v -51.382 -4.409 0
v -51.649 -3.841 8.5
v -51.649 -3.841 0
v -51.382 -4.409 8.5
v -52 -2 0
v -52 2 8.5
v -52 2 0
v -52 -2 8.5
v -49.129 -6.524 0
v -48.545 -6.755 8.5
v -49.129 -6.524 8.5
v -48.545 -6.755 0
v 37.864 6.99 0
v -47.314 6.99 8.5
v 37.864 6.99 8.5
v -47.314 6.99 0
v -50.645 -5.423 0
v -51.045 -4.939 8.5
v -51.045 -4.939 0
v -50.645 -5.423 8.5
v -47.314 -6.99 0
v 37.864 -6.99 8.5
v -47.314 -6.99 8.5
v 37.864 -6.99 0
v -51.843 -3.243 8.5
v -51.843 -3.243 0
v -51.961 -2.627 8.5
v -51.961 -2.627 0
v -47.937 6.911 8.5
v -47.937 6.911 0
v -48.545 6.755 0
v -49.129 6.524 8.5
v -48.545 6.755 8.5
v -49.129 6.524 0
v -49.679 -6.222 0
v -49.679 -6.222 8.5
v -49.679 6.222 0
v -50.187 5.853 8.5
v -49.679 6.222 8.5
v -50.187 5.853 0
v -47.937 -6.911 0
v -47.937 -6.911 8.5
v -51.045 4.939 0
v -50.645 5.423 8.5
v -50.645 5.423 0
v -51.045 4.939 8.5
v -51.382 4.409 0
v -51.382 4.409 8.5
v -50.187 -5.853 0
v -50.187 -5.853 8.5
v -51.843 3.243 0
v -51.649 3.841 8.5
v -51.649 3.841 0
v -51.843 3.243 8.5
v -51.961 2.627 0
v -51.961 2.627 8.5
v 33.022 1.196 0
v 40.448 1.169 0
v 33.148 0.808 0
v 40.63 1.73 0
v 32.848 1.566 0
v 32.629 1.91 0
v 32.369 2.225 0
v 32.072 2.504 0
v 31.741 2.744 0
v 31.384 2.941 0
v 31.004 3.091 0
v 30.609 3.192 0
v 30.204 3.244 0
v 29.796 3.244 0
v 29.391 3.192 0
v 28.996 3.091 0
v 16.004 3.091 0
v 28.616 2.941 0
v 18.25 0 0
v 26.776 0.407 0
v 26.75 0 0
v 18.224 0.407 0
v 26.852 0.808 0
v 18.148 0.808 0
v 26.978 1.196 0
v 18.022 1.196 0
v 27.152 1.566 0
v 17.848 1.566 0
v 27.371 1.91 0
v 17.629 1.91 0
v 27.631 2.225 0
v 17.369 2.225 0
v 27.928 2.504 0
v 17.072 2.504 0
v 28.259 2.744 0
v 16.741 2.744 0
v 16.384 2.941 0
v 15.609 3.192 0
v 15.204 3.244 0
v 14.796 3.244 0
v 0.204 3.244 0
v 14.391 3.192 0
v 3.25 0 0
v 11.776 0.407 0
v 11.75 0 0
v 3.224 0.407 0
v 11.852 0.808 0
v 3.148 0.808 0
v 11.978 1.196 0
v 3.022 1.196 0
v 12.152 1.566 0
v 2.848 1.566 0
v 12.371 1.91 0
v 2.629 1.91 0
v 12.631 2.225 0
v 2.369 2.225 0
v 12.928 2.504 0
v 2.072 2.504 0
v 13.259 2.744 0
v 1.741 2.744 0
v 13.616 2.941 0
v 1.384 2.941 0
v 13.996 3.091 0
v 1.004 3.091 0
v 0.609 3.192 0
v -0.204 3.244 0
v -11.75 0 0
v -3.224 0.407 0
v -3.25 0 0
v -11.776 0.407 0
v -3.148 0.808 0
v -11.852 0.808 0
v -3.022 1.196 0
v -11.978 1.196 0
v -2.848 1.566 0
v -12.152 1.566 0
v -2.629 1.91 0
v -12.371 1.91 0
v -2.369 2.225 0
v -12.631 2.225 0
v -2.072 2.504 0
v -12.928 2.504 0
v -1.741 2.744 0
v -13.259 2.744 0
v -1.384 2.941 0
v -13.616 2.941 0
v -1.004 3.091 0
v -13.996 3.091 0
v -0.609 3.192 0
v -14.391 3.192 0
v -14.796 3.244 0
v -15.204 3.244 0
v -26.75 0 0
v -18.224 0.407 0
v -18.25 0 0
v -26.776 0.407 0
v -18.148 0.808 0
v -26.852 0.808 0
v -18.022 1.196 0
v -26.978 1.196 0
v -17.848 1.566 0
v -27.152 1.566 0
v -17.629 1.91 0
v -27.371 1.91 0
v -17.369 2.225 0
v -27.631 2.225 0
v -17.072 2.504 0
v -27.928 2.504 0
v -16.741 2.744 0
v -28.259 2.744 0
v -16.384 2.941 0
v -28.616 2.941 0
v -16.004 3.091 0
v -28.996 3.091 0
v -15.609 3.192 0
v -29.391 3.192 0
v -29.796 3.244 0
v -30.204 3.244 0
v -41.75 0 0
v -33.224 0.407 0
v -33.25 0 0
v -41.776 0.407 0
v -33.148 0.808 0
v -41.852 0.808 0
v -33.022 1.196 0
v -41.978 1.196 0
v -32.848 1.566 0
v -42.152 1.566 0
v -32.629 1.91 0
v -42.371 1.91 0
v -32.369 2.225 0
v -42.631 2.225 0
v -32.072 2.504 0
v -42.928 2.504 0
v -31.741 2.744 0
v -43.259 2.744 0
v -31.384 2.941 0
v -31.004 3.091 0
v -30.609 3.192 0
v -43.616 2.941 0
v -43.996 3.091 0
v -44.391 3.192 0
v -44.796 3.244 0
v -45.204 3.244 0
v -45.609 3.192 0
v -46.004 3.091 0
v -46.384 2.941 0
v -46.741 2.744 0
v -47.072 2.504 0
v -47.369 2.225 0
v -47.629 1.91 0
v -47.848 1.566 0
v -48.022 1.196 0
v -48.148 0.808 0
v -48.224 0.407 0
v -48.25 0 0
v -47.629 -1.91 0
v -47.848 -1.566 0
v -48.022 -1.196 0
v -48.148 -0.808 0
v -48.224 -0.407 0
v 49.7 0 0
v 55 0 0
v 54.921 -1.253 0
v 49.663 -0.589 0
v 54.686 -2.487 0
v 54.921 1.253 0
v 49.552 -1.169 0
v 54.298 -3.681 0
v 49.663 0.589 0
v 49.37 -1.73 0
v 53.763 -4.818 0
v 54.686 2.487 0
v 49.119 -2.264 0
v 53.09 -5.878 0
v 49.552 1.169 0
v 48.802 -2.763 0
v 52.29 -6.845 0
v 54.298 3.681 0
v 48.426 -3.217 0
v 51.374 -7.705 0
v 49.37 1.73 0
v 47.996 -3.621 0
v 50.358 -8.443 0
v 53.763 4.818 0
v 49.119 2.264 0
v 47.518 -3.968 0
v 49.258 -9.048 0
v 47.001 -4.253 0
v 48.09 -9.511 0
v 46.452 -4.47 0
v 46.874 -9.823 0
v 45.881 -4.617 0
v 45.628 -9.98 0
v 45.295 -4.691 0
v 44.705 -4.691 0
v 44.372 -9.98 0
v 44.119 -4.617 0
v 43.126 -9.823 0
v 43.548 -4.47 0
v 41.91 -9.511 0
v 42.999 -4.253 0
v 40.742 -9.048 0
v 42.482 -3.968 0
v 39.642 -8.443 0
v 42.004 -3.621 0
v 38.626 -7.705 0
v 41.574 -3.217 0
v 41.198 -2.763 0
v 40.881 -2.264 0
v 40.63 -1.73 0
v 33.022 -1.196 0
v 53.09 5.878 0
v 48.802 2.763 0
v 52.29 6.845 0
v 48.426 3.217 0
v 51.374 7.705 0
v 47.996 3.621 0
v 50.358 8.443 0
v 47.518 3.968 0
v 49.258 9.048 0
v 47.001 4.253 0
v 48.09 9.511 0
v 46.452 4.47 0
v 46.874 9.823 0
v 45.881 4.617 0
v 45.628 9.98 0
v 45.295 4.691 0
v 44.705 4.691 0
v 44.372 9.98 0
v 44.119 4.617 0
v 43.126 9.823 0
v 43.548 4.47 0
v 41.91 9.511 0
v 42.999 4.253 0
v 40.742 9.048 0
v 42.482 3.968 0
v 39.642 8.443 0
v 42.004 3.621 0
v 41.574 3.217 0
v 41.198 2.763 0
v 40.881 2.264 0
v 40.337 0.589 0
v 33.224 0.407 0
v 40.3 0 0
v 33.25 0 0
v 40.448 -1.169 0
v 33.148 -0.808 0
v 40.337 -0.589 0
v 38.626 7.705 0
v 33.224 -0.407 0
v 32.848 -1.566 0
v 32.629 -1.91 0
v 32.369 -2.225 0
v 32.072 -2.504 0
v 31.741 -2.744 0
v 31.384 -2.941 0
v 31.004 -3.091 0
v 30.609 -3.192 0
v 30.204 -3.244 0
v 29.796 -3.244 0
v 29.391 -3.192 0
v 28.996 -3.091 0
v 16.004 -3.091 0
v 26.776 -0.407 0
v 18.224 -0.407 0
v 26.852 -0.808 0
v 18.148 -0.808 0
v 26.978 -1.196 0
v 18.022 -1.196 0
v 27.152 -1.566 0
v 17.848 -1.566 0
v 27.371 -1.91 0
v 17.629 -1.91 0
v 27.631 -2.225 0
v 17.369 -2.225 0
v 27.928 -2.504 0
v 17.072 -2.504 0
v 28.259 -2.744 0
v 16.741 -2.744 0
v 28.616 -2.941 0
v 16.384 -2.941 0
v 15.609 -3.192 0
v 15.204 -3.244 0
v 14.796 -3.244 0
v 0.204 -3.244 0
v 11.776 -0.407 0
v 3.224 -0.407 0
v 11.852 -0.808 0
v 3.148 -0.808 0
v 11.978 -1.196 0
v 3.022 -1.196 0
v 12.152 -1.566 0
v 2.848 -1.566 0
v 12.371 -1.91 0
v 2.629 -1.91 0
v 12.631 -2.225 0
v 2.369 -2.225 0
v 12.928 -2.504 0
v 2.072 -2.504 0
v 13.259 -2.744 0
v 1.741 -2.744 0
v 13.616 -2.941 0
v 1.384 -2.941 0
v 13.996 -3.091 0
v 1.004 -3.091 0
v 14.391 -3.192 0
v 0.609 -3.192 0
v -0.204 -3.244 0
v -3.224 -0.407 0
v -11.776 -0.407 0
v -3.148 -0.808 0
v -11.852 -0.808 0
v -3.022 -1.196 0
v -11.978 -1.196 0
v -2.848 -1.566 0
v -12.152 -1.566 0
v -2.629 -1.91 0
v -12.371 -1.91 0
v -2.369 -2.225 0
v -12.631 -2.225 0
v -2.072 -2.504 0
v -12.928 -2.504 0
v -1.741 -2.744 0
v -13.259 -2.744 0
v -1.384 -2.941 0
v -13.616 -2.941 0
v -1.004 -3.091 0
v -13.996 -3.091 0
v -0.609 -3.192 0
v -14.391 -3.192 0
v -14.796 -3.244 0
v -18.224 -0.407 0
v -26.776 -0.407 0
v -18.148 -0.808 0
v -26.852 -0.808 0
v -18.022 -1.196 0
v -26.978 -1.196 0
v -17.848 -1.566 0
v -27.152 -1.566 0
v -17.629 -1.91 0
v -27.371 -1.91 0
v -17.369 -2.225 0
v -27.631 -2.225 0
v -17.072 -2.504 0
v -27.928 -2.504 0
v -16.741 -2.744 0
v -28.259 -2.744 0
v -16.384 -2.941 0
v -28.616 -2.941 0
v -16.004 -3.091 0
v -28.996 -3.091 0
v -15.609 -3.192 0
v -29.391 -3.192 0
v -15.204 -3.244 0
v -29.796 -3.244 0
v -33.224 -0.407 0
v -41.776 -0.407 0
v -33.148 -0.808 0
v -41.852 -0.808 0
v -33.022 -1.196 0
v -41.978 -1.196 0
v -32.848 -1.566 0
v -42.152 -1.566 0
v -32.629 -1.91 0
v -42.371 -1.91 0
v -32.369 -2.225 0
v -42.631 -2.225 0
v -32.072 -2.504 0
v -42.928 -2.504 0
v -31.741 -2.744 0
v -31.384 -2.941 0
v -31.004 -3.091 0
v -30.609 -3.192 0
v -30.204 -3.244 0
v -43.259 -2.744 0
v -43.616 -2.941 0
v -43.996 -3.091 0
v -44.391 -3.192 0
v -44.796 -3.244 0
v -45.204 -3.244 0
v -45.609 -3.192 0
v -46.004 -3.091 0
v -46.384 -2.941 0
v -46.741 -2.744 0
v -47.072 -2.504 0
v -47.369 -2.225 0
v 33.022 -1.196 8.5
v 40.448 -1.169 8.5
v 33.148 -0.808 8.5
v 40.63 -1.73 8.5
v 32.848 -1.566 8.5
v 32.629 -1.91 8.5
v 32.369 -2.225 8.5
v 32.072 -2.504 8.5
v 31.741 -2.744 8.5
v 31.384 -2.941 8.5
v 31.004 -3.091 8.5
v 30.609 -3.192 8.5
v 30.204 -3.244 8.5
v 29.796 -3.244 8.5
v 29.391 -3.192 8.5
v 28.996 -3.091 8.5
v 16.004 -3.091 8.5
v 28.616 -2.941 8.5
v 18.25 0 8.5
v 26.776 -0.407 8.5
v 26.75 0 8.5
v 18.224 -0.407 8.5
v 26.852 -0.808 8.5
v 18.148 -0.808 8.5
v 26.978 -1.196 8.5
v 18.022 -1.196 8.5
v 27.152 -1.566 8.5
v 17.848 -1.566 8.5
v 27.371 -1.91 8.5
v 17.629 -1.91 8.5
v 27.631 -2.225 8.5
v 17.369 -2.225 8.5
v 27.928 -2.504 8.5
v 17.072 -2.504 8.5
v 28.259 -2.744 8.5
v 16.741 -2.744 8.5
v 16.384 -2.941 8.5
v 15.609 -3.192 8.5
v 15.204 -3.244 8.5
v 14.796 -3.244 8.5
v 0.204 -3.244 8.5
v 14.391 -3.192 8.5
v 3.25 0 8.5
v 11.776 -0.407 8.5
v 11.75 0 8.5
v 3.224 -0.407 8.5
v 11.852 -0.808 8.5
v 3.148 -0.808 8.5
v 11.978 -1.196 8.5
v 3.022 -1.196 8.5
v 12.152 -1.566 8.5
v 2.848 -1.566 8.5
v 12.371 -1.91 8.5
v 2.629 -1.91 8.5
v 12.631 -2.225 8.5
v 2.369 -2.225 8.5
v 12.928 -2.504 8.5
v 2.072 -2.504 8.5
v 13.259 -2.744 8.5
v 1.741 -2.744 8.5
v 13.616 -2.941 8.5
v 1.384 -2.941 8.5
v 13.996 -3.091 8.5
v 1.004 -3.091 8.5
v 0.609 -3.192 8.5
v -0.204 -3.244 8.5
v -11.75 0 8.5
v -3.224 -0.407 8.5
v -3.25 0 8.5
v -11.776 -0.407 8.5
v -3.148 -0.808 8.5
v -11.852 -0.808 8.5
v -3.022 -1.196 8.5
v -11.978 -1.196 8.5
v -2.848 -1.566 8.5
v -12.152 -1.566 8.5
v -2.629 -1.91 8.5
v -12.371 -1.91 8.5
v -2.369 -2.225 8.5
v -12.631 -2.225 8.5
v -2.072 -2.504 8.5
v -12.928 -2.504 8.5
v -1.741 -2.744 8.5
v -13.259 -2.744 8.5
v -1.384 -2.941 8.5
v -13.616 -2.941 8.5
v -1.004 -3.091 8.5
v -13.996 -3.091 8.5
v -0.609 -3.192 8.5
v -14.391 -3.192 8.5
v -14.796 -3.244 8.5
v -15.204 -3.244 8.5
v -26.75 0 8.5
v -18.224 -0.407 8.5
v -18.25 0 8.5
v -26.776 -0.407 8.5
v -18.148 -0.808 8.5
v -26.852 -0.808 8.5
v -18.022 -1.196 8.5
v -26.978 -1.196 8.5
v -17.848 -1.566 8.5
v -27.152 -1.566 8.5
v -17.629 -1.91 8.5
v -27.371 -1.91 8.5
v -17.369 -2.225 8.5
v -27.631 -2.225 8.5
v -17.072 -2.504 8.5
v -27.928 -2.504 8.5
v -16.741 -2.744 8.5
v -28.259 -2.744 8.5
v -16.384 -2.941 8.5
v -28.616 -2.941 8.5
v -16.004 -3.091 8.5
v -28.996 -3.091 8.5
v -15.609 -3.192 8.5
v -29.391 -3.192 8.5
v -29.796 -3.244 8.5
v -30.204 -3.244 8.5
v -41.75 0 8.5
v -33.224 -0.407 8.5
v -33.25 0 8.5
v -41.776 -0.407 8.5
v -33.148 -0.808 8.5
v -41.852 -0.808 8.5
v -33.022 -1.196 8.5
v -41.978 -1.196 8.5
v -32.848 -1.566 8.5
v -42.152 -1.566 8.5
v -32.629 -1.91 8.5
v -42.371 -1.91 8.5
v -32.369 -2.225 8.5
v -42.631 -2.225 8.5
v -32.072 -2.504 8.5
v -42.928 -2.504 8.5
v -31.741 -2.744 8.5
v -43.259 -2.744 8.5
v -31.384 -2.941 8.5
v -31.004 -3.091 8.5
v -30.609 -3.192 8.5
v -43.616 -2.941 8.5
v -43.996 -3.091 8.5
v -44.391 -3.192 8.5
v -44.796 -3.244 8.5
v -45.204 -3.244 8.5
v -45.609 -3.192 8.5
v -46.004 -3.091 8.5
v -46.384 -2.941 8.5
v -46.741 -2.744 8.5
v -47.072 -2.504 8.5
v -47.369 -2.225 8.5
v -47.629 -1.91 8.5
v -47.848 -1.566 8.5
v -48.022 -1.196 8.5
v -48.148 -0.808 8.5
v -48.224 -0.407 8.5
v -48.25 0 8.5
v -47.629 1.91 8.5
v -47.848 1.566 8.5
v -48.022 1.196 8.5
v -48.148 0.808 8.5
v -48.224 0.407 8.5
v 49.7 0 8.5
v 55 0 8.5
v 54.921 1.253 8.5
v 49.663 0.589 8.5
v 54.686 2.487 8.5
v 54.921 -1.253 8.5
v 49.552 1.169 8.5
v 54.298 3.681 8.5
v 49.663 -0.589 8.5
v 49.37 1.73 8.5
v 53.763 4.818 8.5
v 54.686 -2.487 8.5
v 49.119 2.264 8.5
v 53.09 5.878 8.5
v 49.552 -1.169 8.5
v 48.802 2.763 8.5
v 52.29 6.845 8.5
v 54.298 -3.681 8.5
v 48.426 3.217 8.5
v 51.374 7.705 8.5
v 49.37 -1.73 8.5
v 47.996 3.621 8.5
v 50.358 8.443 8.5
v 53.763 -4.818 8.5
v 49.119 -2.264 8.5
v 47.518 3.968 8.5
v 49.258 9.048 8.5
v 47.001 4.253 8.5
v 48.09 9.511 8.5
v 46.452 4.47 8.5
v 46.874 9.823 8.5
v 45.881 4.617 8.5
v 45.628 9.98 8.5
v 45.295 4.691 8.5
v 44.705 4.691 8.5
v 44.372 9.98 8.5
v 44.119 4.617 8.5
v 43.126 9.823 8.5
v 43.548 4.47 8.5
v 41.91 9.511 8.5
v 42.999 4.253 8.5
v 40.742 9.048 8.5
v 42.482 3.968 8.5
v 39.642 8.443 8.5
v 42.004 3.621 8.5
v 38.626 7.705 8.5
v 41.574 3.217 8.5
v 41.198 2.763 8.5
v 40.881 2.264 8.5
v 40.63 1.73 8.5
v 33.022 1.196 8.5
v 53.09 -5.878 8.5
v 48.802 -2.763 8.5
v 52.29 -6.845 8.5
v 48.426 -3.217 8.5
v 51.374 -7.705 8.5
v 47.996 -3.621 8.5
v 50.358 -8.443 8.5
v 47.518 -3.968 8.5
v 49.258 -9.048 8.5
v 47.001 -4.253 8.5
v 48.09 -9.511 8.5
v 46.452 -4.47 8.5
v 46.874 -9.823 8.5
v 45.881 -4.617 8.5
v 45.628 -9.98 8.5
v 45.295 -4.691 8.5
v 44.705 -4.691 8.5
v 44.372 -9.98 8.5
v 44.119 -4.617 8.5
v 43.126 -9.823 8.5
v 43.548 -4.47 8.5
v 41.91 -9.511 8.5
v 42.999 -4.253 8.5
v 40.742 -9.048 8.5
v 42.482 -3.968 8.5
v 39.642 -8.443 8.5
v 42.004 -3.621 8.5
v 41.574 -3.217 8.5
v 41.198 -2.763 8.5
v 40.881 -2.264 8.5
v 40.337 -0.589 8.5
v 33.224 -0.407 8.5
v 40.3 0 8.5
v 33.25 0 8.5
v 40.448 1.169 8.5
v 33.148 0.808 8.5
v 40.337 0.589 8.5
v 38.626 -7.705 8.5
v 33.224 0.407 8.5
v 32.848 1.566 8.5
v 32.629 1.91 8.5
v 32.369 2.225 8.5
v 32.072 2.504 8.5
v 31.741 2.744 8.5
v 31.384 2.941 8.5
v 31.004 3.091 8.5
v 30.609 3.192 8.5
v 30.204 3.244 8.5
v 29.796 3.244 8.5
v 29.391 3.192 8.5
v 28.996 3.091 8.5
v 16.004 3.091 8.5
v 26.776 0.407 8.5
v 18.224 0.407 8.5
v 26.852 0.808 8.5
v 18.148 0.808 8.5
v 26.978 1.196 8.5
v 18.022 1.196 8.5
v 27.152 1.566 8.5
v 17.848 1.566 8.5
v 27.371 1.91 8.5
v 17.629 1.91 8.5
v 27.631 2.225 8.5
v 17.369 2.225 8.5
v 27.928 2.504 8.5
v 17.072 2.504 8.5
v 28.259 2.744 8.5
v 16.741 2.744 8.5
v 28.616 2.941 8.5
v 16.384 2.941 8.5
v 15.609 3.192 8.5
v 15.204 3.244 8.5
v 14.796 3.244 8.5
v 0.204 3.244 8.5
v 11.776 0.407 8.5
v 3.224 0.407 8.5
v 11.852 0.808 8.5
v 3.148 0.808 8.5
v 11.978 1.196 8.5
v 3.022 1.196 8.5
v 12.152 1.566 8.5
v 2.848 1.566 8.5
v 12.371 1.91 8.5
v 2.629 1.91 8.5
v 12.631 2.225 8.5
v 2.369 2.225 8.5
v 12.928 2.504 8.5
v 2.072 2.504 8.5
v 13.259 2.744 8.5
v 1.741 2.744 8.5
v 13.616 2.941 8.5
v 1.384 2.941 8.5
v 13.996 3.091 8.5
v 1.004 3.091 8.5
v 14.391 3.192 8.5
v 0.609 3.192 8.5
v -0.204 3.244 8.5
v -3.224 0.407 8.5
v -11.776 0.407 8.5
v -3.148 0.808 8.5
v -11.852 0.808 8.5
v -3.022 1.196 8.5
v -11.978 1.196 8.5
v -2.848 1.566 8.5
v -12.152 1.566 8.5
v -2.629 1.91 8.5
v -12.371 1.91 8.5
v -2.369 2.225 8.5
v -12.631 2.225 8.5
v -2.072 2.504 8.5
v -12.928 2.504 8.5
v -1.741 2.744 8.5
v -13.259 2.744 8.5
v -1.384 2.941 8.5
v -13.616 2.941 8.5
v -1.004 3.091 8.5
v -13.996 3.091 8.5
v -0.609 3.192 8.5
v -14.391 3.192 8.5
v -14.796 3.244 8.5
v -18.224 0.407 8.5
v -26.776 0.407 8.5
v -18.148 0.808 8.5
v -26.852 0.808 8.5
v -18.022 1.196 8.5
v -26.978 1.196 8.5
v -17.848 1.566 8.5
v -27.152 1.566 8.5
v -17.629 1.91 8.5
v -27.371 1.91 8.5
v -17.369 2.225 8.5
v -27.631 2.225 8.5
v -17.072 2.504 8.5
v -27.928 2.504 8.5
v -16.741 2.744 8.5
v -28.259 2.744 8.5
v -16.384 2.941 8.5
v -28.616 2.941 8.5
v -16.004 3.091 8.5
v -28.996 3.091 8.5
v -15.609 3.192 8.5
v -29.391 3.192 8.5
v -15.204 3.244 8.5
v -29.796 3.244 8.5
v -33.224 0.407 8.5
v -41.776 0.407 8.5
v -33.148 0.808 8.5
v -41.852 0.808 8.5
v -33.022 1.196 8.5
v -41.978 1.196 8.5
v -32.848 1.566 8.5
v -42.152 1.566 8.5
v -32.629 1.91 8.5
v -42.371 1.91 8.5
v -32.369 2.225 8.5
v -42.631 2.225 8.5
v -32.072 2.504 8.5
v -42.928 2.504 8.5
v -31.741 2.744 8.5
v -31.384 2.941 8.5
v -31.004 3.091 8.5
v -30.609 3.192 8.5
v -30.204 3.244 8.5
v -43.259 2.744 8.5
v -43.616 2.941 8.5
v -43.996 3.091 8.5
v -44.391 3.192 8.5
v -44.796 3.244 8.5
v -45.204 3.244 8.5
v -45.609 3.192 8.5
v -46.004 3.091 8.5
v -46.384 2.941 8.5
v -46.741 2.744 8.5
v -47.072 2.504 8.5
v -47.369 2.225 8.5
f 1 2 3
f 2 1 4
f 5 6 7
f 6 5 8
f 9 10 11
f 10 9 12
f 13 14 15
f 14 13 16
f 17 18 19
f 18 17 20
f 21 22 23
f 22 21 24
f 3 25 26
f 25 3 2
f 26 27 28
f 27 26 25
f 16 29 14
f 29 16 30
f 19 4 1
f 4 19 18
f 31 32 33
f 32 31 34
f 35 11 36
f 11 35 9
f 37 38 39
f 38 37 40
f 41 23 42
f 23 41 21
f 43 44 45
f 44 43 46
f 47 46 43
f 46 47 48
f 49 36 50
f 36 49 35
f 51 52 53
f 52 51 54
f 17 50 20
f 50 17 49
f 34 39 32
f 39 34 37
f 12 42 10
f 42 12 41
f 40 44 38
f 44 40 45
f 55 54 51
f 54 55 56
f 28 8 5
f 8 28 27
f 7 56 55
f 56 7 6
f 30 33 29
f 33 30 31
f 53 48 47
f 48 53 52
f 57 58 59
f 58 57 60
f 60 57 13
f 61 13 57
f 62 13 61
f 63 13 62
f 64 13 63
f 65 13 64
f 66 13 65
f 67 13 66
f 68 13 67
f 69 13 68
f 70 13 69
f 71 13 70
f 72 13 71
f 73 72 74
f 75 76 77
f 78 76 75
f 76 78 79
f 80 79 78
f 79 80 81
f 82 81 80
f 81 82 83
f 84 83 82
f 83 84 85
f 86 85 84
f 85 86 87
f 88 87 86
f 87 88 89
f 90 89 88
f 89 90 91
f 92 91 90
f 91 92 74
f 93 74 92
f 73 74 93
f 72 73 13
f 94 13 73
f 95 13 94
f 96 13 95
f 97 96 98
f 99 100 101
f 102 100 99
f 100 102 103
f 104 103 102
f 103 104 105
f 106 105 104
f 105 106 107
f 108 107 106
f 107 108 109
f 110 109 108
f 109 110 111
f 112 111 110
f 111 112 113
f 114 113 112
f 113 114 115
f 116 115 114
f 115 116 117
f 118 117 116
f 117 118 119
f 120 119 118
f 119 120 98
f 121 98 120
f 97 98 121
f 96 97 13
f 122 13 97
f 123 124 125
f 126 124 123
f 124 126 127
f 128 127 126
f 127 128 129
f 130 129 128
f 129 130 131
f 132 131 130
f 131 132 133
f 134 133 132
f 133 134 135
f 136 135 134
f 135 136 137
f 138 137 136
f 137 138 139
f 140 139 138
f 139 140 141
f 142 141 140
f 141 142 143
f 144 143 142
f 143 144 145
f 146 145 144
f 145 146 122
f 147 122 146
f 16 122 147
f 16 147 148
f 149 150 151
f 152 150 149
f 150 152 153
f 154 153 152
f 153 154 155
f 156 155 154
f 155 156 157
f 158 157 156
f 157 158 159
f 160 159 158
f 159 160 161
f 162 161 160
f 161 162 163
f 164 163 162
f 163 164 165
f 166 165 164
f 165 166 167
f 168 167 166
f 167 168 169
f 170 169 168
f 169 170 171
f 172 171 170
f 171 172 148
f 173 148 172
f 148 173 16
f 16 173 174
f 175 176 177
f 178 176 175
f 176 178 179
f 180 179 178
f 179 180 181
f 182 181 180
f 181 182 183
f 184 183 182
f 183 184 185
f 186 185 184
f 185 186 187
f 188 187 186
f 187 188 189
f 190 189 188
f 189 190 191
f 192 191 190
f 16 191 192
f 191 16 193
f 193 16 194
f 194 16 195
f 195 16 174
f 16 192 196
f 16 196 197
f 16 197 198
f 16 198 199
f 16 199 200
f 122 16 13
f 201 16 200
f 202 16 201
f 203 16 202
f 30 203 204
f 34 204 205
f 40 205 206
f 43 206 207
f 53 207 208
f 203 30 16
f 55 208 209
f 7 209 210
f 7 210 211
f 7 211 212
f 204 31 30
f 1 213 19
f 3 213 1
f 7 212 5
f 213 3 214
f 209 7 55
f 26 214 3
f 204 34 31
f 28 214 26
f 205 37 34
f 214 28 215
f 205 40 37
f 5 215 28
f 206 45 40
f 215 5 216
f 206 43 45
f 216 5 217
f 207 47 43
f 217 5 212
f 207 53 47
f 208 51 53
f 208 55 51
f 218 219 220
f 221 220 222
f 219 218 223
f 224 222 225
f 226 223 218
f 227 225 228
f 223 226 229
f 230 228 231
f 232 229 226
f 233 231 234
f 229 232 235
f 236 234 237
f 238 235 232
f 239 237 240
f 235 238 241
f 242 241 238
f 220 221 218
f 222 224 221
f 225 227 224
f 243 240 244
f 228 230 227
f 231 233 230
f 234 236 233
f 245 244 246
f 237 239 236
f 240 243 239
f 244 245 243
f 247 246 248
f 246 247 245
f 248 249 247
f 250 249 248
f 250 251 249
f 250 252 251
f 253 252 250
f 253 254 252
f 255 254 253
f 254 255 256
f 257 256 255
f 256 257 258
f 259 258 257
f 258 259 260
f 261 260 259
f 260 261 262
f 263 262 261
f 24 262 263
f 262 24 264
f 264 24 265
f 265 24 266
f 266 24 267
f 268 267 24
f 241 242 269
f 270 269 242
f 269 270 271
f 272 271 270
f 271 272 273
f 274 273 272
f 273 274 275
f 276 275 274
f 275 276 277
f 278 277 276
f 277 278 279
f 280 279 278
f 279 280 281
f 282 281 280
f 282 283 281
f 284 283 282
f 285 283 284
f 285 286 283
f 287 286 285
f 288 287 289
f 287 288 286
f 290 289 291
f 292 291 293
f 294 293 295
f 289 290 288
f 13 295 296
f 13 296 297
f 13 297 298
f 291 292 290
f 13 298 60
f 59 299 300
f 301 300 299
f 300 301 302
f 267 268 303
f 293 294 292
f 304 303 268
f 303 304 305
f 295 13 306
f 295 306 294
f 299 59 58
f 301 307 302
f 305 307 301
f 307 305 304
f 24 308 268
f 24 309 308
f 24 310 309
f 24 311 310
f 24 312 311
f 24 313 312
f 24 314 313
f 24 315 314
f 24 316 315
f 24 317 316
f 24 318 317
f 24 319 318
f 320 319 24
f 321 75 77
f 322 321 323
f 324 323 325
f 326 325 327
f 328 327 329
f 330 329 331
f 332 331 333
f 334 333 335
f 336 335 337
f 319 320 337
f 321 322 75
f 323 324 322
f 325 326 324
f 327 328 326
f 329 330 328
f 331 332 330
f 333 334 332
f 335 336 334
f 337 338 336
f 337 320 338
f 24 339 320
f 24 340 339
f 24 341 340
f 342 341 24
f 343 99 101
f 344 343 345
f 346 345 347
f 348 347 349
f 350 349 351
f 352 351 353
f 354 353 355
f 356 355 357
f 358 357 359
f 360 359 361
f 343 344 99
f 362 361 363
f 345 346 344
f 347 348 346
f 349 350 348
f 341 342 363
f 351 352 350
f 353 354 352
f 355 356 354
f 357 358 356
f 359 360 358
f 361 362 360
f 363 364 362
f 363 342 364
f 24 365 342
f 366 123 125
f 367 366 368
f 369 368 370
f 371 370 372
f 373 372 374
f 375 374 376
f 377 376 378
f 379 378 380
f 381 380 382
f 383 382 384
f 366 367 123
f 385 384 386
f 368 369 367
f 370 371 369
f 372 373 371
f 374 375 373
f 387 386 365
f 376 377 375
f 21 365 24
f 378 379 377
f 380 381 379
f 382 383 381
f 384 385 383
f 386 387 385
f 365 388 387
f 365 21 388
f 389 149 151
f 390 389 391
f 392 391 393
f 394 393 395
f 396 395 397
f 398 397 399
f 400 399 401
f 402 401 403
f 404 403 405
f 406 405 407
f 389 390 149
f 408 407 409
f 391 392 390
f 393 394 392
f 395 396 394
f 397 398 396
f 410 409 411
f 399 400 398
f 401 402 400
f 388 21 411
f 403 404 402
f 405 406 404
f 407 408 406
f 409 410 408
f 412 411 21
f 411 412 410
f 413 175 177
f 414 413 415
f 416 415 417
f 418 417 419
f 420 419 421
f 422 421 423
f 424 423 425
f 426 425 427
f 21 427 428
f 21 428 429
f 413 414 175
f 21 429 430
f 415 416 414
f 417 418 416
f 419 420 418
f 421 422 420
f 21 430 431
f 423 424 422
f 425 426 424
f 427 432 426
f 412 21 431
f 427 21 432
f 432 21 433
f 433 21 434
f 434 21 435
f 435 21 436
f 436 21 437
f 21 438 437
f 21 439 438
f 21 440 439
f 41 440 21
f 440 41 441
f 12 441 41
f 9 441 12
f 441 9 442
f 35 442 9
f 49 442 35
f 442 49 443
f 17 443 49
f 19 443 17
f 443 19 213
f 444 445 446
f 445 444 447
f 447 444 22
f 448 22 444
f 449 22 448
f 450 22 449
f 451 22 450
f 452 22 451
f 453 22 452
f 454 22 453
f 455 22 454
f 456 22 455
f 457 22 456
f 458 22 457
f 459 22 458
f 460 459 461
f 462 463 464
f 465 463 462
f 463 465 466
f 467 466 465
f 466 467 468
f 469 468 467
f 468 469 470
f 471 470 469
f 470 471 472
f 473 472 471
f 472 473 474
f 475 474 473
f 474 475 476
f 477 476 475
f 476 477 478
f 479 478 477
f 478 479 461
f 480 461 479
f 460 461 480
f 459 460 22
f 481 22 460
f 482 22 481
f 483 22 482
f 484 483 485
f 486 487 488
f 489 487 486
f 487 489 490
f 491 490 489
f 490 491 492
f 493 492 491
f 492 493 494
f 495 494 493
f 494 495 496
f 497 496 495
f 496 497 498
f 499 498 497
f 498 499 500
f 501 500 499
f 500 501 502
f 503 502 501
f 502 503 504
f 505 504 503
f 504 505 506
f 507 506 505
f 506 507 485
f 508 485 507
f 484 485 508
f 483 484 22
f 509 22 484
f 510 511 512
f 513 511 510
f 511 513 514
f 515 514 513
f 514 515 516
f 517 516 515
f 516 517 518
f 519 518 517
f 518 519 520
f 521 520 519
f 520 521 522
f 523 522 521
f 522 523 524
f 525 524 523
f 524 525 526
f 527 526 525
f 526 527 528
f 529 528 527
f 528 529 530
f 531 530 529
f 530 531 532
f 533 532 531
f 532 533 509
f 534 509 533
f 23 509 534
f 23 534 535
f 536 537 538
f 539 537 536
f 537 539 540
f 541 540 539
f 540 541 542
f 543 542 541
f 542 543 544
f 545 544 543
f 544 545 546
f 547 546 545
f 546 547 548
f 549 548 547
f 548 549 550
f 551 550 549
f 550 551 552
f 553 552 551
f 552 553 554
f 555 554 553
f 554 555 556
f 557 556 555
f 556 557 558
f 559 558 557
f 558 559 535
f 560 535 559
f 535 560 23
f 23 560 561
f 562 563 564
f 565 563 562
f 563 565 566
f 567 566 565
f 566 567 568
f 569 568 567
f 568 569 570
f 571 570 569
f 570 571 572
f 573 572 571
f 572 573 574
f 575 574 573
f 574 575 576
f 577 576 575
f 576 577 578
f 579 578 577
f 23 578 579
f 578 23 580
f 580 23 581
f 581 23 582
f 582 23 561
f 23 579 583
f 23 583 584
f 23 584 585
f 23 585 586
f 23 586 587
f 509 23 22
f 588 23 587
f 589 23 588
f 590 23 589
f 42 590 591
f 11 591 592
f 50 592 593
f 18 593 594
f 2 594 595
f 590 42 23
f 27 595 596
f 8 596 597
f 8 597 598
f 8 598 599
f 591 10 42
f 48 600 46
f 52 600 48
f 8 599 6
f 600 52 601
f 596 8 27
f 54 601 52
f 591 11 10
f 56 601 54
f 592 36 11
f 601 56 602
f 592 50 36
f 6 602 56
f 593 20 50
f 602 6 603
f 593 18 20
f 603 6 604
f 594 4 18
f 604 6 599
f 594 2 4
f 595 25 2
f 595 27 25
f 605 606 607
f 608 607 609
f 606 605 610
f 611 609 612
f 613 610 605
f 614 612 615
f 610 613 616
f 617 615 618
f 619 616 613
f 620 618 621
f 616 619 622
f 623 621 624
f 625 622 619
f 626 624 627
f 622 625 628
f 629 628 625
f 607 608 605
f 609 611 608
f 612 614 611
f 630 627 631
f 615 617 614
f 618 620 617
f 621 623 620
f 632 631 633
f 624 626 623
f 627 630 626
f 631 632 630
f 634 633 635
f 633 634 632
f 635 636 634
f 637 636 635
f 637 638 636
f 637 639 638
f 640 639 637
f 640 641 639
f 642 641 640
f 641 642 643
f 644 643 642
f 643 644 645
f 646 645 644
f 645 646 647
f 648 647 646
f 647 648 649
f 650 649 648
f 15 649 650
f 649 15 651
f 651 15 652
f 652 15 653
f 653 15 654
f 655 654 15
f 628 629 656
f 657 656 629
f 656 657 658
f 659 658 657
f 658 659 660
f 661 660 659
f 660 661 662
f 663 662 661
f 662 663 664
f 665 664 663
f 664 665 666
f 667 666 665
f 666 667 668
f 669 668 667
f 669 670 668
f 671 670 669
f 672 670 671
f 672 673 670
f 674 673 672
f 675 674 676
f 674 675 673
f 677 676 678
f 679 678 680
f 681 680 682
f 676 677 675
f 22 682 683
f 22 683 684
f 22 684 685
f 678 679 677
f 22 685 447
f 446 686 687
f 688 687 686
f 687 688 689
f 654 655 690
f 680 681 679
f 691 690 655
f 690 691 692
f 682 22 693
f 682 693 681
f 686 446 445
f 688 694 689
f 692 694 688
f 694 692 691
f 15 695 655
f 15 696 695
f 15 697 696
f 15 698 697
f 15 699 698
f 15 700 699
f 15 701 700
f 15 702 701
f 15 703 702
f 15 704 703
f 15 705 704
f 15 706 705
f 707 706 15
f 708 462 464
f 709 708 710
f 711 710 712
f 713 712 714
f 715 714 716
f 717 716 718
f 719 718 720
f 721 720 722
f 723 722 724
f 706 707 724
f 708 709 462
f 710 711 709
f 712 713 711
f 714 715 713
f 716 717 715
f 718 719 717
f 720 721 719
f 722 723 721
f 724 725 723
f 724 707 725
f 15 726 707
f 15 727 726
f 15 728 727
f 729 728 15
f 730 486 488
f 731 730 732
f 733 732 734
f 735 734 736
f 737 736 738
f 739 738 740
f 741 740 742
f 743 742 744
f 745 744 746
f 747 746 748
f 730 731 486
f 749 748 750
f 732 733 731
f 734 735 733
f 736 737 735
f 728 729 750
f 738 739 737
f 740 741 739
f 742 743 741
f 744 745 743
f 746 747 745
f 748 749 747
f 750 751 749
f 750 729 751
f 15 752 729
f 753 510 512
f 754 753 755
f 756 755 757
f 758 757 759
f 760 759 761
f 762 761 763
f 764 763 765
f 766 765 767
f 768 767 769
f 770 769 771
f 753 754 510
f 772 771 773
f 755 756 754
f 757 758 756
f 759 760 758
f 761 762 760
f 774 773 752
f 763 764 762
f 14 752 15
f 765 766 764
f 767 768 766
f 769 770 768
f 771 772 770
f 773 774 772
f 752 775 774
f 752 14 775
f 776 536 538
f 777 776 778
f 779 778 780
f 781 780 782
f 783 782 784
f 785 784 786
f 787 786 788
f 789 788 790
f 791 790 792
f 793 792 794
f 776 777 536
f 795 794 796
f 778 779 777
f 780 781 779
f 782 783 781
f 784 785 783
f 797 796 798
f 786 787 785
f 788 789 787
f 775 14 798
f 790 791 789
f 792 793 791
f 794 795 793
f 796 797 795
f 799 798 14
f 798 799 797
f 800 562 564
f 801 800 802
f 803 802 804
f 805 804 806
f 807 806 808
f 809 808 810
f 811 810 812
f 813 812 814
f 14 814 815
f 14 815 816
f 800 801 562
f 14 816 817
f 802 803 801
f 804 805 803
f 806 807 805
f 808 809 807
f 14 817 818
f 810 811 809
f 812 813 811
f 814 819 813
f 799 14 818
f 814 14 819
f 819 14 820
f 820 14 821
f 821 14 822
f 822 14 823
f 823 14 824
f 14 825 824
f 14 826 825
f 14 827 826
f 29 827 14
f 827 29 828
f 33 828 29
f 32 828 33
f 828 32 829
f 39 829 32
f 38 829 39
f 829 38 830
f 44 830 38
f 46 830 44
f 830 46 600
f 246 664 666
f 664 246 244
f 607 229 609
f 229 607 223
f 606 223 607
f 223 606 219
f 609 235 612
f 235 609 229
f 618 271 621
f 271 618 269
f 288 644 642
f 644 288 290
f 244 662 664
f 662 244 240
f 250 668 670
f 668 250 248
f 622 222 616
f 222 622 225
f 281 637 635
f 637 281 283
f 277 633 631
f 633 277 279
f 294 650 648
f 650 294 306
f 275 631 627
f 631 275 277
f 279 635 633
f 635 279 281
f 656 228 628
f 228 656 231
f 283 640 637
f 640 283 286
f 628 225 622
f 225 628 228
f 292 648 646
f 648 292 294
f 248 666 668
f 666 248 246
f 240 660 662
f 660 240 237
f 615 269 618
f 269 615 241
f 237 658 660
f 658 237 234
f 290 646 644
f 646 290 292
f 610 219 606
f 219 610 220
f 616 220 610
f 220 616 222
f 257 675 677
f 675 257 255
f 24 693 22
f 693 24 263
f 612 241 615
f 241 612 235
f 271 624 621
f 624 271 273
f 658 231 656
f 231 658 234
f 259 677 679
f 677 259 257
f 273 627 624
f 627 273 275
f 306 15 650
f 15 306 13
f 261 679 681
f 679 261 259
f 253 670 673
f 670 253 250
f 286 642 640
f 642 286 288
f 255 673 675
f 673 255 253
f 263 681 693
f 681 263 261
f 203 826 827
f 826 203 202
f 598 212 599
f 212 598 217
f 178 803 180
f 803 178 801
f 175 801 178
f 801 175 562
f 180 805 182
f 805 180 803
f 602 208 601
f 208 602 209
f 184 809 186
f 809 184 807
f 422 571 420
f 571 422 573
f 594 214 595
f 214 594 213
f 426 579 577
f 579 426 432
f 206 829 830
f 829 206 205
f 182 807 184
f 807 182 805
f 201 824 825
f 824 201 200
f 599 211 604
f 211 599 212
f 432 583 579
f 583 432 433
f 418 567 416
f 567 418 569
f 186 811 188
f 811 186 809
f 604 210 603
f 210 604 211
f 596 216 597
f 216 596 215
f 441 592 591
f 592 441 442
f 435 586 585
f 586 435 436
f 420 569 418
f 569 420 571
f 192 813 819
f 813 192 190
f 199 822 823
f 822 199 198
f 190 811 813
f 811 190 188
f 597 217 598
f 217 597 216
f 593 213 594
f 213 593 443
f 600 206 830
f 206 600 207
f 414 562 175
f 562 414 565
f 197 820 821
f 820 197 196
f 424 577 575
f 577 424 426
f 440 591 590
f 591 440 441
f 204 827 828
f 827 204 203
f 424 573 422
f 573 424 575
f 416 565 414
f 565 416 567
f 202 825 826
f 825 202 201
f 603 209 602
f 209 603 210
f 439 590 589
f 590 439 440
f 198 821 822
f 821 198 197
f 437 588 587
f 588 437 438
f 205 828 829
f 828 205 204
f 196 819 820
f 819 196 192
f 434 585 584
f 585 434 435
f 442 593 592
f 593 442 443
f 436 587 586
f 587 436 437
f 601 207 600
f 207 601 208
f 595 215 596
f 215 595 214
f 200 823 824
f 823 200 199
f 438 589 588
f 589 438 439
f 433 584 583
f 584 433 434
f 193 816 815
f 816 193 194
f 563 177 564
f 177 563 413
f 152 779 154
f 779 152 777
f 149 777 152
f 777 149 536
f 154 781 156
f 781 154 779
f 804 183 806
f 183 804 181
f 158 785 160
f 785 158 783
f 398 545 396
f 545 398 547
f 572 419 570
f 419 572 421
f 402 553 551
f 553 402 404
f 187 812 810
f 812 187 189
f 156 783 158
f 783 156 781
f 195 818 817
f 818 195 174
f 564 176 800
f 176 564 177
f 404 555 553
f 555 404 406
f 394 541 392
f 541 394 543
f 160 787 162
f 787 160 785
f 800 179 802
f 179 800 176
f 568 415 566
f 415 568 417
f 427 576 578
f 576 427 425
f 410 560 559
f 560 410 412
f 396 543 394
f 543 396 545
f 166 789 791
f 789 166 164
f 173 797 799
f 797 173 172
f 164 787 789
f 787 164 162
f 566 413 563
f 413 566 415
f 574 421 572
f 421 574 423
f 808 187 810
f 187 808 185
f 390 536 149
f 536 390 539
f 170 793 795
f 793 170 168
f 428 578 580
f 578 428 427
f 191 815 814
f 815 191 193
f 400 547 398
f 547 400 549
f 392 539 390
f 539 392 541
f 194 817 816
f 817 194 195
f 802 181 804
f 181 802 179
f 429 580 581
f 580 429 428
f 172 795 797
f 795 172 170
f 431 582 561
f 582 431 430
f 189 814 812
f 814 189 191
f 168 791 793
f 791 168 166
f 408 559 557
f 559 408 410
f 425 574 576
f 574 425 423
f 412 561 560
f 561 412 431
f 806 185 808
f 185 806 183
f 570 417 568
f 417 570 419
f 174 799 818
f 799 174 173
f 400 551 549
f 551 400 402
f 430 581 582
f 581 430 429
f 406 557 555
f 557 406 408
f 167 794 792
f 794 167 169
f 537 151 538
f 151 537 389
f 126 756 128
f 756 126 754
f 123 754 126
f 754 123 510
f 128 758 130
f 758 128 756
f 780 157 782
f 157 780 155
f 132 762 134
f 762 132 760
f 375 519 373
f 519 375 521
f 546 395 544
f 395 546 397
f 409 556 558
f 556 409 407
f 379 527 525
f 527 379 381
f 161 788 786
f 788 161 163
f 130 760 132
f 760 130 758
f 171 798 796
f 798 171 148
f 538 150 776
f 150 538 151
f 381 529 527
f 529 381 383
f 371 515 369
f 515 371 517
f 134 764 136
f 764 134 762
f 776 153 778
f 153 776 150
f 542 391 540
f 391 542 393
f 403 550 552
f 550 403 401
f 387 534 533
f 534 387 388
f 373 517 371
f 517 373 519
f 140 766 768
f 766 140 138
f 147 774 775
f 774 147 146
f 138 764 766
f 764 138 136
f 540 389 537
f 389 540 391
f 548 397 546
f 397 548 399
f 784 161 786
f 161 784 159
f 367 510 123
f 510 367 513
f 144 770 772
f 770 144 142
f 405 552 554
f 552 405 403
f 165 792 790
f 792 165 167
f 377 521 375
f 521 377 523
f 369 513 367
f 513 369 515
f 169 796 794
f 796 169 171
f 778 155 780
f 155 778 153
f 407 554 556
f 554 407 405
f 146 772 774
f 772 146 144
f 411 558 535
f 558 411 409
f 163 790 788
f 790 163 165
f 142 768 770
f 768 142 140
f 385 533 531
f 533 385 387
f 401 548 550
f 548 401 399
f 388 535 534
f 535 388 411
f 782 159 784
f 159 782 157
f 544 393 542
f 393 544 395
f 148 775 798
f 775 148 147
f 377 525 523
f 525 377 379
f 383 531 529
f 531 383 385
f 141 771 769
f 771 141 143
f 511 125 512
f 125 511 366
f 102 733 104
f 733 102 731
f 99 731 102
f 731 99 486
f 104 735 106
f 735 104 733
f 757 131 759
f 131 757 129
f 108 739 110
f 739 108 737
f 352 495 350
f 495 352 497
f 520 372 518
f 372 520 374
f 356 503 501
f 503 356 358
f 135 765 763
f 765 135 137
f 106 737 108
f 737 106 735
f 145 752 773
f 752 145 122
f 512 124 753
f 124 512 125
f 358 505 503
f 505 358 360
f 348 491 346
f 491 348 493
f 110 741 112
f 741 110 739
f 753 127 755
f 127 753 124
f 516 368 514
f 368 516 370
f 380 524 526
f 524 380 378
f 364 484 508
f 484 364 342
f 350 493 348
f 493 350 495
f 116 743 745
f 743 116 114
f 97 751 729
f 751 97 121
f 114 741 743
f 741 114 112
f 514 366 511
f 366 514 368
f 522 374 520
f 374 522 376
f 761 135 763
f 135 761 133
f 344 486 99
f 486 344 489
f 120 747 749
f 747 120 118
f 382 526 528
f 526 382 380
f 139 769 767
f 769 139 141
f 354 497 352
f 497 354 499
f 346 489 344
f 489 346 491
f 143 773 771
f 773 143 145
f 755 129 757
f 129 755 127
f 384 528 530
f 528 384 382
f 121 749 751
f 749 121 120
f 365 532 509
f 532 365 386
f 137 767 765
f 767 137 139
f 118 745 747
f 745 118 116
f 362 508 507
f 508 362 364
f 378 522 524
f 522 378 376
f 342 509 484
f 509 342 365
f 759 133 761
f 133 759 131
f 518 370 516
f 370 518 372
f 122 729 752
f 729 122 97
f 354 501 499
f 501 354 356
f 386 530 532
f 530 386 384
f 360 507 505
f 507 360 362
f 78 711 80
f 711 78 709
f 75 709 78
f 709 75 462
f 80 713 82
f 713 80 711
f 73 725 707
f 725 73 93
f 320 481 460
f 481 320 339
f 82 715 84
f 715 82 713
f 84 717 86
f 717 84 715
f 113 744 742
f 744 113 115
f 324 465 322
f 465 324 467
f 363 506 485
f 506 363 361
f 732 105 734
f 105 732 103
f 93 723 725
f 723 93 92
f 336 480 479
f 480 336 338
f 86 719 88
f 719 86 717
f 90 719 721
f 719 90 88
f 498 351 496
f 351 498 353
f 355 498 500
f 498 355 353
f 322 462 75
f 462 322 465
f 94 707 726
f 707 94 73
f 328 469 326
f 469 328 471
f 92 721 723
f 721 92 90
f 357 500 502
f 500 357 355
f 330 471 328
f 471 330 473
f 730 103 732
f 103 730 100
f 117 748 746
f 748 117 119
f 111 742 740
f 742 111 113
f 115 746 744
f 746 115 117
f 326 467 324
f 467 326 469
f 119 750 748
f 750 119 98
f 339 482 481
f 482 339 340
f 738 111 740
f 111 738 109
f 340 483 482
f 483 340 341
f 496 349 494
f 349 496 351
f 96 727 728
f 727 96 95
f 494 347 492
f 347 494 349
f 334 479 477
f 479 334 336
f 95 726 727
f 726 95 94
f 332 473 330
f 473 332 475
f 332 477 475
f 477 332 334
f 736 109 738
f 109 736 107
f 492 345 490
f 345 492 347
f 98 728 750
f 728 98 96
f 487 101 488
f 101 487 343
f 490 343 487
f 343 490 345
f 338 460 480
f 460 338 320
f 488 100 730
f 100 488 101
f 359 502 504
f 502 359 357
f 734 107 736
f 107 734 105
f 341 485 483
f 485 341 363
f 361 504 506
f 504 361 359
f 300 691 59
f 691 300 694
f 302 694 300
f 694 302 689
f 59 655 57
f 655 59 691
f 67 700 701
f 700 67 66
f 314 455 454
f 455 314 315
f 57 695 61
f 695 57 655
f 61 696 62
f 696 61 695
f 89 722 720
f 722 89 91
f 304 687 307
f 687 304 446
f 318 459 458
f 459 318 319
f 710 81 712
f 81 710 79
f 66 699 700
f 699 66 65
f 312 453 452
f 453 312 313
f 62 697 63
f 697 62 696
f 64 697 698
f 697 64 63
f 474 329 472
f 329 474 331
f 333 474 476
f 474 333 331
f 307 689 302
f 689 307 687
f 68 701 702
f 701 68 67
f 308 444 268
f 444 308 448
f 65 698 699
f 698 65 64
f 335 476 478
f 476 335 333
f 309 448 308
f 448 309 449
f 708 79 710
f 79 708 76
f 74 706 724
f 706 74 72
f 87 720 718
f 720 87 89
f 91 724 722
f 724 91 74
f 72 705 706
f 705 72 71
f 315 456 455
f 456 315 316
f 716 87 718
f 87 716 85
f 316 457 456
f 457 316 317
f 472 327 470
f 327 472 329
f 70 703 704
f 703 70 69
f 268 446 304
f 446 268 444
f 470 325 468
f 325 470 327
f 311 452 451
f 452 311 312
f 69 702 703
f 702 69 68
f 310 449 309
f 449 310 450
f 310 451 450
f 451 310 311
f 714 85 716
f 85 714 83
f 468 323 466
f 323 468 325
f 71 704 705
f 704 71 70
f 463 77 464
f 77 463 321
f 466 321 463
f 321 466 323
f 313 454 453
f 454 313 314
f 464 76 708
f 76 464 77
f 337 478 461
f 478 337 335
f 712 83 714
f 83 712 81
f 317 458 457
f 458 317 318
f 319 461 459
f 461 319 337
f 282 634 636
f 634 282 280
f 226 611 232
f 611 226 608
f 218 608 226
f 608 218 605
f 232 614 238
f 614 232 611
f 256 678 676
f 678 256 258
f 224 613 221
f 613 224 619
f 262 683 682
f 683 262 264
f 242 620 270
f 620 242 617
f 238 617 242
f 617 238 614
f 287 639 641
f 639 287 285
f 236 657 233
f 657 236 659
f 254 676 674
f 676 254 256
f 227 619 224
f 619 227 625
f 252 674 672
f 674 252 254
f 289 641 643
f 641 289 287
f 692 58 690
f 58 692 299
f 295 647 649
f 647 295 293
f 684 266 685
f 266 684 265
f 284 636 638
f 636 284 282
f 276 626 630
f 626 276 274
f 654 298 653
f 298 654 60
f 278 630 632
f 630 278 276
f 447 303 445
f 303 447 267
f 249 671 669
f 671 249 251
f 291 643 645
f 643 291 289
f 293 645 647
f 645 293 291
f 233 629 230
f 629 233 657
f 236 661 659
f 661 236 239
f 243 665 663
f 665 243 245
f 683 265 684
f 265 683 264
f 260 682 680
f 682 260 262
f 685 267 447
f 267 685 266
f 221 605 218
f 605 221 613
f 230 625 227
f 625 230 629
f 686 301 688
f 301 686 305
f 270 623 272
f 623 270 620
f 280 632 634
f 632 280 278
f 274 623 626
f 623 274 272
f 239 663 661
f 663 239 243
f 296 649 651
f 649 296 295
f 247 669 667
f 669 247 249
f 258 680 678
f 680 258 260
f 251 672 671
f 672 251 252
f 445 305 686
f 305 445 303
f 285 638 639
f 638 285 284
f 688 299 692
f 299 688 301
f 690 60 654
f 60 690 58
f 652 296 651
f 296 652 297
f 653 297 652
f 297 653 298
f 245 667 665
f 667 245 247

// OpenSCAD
$fn = 50;


difference() {
	union() {
		*color(alpha = 1.0000000000, c = "gray") {
			translate(v = [0, 7, 0]) {
				linear_extrude(height = 1) {
					text(font = "Arial:style=Bold", halign = "center", size = 4.5000000000, text = "COMMENT plate main", valign = "center");
				}
			}
		}
		*color(alpha = 1.0000000000, c = "gray") {
			translate(v = [0, 14, 0]) {
				linear_extrude(height = 1) {
					text(font = "Arial:style=Bold", halign = "center", size = 4.5000000000, text = "COMMENT description oobb_plate_shape_p_type_8.5_depth_7_width_1_height_8.5_thickness_slip_end_extra", valign = "center");
				}
			}
		}
		hull() {
			translate(v = [-47.0000000000, 2.0000000000, 0]) {
				cylinder(h = 8.5000000000, r = 5);
			}
			translate(v = [47.0000000000, 2.0000000000, 0]) {
				cylinder(h = 8.5000000000, r = 5);
			}
			translate(v = [-47.0000000000, -2.0000000000, 0]) {
				cylinder(h = 8.5000000000, r = 5);
			}
			translate(v = [47.0000000000, -2.0000000000, 0]) {
				cylinder(h = 8.5000000000, r = 5);
			}
		}
		translate(v = [45.0000000000, 0, 0.0000000000]) {
			cylinder(h = 8.5000000000, r = 10.0000000000);
		}
	}
	union() {
		*color(alpha = 1.0000000000, c = "gray") {
			translate(v = [0, 7, 0]) {
				linear_extrude(height = 1) {
					text(font = "Arial:style=Bold", halign = "center", size = 4.5000000000, text = "COMMENT holes main", valign = "center");
				}
			}
		}
		*color(alpha = 1.0000000000, c = "gray") {
			translate(v = [0, 14, 0]) {
				linear_extrude(height = 1) {
					text(font = "Arial:style=Bold", halign = "center", size = 4.5000000000, text = "COMMENT description oobb_holes_shape_n_type_7_width_1_height_8.5_thickness_slip_end_extra_false_both_holes", valign = "center");
				}
			}
		}
		translate(v = [-45.0000000000, 0.0000000000, 0]) {
			translate(v = [0, 0, -50]) {
				cylinder(h = 100, r = 3.2500000000);
			}
		}
		translate(v = [-30.0000000000, 0.0000000000, 0]) {
			translate(v = [0, 0, -50]) {
				cylinder(h = 100, r = 3.2500000000);
			}
		}
		translate(v = [-15.0000000000, 0.0000000000, 0]) {
			translate(v = [0, 0, -50]) {
				cylinder(h = 100, r = 3.2500000000);
			}
		}
		translate(v = [0, 0, -50]) {
			cylinder(h = 100, r = 3.2500000000);
		}
		translate(v = [15.0000000000, 0.0000000000, 0]) {
			translate(v = [0, 0, -50]) {
				cylinder(h = 100, r = 3.2500000000);
			}
		}
		translate(v = [30.0000000000, 0.0000000000, 0]) {
			translate(v = [0, 0, -50]) {
				cylinder(h = 100, r = 3.2500000000);
			}
		}
		translate(v = [45.0000000000, 0.0000000000, 0]) {
			translate(v = [0, 0, -50]) {
				cylinder(h = 100, r = 3.2500000000);
			}
		}
		*color(alpha = 1.0000000000, c = "gray") {
			translate(v = [0, 7, 0]) {
				linear_extrude(height = 1) {
					text(font = "Arial:style=Bold", halign = "center", size = 4.5000000000, text = "COMMENT slip_end", valign = "center");
				}
			}
		}
		translate(v = [45.0000000000, 0, -50.0000000000]) {
			cylinder(h = 100, r = 4.7000000000);
		}
	}
}
